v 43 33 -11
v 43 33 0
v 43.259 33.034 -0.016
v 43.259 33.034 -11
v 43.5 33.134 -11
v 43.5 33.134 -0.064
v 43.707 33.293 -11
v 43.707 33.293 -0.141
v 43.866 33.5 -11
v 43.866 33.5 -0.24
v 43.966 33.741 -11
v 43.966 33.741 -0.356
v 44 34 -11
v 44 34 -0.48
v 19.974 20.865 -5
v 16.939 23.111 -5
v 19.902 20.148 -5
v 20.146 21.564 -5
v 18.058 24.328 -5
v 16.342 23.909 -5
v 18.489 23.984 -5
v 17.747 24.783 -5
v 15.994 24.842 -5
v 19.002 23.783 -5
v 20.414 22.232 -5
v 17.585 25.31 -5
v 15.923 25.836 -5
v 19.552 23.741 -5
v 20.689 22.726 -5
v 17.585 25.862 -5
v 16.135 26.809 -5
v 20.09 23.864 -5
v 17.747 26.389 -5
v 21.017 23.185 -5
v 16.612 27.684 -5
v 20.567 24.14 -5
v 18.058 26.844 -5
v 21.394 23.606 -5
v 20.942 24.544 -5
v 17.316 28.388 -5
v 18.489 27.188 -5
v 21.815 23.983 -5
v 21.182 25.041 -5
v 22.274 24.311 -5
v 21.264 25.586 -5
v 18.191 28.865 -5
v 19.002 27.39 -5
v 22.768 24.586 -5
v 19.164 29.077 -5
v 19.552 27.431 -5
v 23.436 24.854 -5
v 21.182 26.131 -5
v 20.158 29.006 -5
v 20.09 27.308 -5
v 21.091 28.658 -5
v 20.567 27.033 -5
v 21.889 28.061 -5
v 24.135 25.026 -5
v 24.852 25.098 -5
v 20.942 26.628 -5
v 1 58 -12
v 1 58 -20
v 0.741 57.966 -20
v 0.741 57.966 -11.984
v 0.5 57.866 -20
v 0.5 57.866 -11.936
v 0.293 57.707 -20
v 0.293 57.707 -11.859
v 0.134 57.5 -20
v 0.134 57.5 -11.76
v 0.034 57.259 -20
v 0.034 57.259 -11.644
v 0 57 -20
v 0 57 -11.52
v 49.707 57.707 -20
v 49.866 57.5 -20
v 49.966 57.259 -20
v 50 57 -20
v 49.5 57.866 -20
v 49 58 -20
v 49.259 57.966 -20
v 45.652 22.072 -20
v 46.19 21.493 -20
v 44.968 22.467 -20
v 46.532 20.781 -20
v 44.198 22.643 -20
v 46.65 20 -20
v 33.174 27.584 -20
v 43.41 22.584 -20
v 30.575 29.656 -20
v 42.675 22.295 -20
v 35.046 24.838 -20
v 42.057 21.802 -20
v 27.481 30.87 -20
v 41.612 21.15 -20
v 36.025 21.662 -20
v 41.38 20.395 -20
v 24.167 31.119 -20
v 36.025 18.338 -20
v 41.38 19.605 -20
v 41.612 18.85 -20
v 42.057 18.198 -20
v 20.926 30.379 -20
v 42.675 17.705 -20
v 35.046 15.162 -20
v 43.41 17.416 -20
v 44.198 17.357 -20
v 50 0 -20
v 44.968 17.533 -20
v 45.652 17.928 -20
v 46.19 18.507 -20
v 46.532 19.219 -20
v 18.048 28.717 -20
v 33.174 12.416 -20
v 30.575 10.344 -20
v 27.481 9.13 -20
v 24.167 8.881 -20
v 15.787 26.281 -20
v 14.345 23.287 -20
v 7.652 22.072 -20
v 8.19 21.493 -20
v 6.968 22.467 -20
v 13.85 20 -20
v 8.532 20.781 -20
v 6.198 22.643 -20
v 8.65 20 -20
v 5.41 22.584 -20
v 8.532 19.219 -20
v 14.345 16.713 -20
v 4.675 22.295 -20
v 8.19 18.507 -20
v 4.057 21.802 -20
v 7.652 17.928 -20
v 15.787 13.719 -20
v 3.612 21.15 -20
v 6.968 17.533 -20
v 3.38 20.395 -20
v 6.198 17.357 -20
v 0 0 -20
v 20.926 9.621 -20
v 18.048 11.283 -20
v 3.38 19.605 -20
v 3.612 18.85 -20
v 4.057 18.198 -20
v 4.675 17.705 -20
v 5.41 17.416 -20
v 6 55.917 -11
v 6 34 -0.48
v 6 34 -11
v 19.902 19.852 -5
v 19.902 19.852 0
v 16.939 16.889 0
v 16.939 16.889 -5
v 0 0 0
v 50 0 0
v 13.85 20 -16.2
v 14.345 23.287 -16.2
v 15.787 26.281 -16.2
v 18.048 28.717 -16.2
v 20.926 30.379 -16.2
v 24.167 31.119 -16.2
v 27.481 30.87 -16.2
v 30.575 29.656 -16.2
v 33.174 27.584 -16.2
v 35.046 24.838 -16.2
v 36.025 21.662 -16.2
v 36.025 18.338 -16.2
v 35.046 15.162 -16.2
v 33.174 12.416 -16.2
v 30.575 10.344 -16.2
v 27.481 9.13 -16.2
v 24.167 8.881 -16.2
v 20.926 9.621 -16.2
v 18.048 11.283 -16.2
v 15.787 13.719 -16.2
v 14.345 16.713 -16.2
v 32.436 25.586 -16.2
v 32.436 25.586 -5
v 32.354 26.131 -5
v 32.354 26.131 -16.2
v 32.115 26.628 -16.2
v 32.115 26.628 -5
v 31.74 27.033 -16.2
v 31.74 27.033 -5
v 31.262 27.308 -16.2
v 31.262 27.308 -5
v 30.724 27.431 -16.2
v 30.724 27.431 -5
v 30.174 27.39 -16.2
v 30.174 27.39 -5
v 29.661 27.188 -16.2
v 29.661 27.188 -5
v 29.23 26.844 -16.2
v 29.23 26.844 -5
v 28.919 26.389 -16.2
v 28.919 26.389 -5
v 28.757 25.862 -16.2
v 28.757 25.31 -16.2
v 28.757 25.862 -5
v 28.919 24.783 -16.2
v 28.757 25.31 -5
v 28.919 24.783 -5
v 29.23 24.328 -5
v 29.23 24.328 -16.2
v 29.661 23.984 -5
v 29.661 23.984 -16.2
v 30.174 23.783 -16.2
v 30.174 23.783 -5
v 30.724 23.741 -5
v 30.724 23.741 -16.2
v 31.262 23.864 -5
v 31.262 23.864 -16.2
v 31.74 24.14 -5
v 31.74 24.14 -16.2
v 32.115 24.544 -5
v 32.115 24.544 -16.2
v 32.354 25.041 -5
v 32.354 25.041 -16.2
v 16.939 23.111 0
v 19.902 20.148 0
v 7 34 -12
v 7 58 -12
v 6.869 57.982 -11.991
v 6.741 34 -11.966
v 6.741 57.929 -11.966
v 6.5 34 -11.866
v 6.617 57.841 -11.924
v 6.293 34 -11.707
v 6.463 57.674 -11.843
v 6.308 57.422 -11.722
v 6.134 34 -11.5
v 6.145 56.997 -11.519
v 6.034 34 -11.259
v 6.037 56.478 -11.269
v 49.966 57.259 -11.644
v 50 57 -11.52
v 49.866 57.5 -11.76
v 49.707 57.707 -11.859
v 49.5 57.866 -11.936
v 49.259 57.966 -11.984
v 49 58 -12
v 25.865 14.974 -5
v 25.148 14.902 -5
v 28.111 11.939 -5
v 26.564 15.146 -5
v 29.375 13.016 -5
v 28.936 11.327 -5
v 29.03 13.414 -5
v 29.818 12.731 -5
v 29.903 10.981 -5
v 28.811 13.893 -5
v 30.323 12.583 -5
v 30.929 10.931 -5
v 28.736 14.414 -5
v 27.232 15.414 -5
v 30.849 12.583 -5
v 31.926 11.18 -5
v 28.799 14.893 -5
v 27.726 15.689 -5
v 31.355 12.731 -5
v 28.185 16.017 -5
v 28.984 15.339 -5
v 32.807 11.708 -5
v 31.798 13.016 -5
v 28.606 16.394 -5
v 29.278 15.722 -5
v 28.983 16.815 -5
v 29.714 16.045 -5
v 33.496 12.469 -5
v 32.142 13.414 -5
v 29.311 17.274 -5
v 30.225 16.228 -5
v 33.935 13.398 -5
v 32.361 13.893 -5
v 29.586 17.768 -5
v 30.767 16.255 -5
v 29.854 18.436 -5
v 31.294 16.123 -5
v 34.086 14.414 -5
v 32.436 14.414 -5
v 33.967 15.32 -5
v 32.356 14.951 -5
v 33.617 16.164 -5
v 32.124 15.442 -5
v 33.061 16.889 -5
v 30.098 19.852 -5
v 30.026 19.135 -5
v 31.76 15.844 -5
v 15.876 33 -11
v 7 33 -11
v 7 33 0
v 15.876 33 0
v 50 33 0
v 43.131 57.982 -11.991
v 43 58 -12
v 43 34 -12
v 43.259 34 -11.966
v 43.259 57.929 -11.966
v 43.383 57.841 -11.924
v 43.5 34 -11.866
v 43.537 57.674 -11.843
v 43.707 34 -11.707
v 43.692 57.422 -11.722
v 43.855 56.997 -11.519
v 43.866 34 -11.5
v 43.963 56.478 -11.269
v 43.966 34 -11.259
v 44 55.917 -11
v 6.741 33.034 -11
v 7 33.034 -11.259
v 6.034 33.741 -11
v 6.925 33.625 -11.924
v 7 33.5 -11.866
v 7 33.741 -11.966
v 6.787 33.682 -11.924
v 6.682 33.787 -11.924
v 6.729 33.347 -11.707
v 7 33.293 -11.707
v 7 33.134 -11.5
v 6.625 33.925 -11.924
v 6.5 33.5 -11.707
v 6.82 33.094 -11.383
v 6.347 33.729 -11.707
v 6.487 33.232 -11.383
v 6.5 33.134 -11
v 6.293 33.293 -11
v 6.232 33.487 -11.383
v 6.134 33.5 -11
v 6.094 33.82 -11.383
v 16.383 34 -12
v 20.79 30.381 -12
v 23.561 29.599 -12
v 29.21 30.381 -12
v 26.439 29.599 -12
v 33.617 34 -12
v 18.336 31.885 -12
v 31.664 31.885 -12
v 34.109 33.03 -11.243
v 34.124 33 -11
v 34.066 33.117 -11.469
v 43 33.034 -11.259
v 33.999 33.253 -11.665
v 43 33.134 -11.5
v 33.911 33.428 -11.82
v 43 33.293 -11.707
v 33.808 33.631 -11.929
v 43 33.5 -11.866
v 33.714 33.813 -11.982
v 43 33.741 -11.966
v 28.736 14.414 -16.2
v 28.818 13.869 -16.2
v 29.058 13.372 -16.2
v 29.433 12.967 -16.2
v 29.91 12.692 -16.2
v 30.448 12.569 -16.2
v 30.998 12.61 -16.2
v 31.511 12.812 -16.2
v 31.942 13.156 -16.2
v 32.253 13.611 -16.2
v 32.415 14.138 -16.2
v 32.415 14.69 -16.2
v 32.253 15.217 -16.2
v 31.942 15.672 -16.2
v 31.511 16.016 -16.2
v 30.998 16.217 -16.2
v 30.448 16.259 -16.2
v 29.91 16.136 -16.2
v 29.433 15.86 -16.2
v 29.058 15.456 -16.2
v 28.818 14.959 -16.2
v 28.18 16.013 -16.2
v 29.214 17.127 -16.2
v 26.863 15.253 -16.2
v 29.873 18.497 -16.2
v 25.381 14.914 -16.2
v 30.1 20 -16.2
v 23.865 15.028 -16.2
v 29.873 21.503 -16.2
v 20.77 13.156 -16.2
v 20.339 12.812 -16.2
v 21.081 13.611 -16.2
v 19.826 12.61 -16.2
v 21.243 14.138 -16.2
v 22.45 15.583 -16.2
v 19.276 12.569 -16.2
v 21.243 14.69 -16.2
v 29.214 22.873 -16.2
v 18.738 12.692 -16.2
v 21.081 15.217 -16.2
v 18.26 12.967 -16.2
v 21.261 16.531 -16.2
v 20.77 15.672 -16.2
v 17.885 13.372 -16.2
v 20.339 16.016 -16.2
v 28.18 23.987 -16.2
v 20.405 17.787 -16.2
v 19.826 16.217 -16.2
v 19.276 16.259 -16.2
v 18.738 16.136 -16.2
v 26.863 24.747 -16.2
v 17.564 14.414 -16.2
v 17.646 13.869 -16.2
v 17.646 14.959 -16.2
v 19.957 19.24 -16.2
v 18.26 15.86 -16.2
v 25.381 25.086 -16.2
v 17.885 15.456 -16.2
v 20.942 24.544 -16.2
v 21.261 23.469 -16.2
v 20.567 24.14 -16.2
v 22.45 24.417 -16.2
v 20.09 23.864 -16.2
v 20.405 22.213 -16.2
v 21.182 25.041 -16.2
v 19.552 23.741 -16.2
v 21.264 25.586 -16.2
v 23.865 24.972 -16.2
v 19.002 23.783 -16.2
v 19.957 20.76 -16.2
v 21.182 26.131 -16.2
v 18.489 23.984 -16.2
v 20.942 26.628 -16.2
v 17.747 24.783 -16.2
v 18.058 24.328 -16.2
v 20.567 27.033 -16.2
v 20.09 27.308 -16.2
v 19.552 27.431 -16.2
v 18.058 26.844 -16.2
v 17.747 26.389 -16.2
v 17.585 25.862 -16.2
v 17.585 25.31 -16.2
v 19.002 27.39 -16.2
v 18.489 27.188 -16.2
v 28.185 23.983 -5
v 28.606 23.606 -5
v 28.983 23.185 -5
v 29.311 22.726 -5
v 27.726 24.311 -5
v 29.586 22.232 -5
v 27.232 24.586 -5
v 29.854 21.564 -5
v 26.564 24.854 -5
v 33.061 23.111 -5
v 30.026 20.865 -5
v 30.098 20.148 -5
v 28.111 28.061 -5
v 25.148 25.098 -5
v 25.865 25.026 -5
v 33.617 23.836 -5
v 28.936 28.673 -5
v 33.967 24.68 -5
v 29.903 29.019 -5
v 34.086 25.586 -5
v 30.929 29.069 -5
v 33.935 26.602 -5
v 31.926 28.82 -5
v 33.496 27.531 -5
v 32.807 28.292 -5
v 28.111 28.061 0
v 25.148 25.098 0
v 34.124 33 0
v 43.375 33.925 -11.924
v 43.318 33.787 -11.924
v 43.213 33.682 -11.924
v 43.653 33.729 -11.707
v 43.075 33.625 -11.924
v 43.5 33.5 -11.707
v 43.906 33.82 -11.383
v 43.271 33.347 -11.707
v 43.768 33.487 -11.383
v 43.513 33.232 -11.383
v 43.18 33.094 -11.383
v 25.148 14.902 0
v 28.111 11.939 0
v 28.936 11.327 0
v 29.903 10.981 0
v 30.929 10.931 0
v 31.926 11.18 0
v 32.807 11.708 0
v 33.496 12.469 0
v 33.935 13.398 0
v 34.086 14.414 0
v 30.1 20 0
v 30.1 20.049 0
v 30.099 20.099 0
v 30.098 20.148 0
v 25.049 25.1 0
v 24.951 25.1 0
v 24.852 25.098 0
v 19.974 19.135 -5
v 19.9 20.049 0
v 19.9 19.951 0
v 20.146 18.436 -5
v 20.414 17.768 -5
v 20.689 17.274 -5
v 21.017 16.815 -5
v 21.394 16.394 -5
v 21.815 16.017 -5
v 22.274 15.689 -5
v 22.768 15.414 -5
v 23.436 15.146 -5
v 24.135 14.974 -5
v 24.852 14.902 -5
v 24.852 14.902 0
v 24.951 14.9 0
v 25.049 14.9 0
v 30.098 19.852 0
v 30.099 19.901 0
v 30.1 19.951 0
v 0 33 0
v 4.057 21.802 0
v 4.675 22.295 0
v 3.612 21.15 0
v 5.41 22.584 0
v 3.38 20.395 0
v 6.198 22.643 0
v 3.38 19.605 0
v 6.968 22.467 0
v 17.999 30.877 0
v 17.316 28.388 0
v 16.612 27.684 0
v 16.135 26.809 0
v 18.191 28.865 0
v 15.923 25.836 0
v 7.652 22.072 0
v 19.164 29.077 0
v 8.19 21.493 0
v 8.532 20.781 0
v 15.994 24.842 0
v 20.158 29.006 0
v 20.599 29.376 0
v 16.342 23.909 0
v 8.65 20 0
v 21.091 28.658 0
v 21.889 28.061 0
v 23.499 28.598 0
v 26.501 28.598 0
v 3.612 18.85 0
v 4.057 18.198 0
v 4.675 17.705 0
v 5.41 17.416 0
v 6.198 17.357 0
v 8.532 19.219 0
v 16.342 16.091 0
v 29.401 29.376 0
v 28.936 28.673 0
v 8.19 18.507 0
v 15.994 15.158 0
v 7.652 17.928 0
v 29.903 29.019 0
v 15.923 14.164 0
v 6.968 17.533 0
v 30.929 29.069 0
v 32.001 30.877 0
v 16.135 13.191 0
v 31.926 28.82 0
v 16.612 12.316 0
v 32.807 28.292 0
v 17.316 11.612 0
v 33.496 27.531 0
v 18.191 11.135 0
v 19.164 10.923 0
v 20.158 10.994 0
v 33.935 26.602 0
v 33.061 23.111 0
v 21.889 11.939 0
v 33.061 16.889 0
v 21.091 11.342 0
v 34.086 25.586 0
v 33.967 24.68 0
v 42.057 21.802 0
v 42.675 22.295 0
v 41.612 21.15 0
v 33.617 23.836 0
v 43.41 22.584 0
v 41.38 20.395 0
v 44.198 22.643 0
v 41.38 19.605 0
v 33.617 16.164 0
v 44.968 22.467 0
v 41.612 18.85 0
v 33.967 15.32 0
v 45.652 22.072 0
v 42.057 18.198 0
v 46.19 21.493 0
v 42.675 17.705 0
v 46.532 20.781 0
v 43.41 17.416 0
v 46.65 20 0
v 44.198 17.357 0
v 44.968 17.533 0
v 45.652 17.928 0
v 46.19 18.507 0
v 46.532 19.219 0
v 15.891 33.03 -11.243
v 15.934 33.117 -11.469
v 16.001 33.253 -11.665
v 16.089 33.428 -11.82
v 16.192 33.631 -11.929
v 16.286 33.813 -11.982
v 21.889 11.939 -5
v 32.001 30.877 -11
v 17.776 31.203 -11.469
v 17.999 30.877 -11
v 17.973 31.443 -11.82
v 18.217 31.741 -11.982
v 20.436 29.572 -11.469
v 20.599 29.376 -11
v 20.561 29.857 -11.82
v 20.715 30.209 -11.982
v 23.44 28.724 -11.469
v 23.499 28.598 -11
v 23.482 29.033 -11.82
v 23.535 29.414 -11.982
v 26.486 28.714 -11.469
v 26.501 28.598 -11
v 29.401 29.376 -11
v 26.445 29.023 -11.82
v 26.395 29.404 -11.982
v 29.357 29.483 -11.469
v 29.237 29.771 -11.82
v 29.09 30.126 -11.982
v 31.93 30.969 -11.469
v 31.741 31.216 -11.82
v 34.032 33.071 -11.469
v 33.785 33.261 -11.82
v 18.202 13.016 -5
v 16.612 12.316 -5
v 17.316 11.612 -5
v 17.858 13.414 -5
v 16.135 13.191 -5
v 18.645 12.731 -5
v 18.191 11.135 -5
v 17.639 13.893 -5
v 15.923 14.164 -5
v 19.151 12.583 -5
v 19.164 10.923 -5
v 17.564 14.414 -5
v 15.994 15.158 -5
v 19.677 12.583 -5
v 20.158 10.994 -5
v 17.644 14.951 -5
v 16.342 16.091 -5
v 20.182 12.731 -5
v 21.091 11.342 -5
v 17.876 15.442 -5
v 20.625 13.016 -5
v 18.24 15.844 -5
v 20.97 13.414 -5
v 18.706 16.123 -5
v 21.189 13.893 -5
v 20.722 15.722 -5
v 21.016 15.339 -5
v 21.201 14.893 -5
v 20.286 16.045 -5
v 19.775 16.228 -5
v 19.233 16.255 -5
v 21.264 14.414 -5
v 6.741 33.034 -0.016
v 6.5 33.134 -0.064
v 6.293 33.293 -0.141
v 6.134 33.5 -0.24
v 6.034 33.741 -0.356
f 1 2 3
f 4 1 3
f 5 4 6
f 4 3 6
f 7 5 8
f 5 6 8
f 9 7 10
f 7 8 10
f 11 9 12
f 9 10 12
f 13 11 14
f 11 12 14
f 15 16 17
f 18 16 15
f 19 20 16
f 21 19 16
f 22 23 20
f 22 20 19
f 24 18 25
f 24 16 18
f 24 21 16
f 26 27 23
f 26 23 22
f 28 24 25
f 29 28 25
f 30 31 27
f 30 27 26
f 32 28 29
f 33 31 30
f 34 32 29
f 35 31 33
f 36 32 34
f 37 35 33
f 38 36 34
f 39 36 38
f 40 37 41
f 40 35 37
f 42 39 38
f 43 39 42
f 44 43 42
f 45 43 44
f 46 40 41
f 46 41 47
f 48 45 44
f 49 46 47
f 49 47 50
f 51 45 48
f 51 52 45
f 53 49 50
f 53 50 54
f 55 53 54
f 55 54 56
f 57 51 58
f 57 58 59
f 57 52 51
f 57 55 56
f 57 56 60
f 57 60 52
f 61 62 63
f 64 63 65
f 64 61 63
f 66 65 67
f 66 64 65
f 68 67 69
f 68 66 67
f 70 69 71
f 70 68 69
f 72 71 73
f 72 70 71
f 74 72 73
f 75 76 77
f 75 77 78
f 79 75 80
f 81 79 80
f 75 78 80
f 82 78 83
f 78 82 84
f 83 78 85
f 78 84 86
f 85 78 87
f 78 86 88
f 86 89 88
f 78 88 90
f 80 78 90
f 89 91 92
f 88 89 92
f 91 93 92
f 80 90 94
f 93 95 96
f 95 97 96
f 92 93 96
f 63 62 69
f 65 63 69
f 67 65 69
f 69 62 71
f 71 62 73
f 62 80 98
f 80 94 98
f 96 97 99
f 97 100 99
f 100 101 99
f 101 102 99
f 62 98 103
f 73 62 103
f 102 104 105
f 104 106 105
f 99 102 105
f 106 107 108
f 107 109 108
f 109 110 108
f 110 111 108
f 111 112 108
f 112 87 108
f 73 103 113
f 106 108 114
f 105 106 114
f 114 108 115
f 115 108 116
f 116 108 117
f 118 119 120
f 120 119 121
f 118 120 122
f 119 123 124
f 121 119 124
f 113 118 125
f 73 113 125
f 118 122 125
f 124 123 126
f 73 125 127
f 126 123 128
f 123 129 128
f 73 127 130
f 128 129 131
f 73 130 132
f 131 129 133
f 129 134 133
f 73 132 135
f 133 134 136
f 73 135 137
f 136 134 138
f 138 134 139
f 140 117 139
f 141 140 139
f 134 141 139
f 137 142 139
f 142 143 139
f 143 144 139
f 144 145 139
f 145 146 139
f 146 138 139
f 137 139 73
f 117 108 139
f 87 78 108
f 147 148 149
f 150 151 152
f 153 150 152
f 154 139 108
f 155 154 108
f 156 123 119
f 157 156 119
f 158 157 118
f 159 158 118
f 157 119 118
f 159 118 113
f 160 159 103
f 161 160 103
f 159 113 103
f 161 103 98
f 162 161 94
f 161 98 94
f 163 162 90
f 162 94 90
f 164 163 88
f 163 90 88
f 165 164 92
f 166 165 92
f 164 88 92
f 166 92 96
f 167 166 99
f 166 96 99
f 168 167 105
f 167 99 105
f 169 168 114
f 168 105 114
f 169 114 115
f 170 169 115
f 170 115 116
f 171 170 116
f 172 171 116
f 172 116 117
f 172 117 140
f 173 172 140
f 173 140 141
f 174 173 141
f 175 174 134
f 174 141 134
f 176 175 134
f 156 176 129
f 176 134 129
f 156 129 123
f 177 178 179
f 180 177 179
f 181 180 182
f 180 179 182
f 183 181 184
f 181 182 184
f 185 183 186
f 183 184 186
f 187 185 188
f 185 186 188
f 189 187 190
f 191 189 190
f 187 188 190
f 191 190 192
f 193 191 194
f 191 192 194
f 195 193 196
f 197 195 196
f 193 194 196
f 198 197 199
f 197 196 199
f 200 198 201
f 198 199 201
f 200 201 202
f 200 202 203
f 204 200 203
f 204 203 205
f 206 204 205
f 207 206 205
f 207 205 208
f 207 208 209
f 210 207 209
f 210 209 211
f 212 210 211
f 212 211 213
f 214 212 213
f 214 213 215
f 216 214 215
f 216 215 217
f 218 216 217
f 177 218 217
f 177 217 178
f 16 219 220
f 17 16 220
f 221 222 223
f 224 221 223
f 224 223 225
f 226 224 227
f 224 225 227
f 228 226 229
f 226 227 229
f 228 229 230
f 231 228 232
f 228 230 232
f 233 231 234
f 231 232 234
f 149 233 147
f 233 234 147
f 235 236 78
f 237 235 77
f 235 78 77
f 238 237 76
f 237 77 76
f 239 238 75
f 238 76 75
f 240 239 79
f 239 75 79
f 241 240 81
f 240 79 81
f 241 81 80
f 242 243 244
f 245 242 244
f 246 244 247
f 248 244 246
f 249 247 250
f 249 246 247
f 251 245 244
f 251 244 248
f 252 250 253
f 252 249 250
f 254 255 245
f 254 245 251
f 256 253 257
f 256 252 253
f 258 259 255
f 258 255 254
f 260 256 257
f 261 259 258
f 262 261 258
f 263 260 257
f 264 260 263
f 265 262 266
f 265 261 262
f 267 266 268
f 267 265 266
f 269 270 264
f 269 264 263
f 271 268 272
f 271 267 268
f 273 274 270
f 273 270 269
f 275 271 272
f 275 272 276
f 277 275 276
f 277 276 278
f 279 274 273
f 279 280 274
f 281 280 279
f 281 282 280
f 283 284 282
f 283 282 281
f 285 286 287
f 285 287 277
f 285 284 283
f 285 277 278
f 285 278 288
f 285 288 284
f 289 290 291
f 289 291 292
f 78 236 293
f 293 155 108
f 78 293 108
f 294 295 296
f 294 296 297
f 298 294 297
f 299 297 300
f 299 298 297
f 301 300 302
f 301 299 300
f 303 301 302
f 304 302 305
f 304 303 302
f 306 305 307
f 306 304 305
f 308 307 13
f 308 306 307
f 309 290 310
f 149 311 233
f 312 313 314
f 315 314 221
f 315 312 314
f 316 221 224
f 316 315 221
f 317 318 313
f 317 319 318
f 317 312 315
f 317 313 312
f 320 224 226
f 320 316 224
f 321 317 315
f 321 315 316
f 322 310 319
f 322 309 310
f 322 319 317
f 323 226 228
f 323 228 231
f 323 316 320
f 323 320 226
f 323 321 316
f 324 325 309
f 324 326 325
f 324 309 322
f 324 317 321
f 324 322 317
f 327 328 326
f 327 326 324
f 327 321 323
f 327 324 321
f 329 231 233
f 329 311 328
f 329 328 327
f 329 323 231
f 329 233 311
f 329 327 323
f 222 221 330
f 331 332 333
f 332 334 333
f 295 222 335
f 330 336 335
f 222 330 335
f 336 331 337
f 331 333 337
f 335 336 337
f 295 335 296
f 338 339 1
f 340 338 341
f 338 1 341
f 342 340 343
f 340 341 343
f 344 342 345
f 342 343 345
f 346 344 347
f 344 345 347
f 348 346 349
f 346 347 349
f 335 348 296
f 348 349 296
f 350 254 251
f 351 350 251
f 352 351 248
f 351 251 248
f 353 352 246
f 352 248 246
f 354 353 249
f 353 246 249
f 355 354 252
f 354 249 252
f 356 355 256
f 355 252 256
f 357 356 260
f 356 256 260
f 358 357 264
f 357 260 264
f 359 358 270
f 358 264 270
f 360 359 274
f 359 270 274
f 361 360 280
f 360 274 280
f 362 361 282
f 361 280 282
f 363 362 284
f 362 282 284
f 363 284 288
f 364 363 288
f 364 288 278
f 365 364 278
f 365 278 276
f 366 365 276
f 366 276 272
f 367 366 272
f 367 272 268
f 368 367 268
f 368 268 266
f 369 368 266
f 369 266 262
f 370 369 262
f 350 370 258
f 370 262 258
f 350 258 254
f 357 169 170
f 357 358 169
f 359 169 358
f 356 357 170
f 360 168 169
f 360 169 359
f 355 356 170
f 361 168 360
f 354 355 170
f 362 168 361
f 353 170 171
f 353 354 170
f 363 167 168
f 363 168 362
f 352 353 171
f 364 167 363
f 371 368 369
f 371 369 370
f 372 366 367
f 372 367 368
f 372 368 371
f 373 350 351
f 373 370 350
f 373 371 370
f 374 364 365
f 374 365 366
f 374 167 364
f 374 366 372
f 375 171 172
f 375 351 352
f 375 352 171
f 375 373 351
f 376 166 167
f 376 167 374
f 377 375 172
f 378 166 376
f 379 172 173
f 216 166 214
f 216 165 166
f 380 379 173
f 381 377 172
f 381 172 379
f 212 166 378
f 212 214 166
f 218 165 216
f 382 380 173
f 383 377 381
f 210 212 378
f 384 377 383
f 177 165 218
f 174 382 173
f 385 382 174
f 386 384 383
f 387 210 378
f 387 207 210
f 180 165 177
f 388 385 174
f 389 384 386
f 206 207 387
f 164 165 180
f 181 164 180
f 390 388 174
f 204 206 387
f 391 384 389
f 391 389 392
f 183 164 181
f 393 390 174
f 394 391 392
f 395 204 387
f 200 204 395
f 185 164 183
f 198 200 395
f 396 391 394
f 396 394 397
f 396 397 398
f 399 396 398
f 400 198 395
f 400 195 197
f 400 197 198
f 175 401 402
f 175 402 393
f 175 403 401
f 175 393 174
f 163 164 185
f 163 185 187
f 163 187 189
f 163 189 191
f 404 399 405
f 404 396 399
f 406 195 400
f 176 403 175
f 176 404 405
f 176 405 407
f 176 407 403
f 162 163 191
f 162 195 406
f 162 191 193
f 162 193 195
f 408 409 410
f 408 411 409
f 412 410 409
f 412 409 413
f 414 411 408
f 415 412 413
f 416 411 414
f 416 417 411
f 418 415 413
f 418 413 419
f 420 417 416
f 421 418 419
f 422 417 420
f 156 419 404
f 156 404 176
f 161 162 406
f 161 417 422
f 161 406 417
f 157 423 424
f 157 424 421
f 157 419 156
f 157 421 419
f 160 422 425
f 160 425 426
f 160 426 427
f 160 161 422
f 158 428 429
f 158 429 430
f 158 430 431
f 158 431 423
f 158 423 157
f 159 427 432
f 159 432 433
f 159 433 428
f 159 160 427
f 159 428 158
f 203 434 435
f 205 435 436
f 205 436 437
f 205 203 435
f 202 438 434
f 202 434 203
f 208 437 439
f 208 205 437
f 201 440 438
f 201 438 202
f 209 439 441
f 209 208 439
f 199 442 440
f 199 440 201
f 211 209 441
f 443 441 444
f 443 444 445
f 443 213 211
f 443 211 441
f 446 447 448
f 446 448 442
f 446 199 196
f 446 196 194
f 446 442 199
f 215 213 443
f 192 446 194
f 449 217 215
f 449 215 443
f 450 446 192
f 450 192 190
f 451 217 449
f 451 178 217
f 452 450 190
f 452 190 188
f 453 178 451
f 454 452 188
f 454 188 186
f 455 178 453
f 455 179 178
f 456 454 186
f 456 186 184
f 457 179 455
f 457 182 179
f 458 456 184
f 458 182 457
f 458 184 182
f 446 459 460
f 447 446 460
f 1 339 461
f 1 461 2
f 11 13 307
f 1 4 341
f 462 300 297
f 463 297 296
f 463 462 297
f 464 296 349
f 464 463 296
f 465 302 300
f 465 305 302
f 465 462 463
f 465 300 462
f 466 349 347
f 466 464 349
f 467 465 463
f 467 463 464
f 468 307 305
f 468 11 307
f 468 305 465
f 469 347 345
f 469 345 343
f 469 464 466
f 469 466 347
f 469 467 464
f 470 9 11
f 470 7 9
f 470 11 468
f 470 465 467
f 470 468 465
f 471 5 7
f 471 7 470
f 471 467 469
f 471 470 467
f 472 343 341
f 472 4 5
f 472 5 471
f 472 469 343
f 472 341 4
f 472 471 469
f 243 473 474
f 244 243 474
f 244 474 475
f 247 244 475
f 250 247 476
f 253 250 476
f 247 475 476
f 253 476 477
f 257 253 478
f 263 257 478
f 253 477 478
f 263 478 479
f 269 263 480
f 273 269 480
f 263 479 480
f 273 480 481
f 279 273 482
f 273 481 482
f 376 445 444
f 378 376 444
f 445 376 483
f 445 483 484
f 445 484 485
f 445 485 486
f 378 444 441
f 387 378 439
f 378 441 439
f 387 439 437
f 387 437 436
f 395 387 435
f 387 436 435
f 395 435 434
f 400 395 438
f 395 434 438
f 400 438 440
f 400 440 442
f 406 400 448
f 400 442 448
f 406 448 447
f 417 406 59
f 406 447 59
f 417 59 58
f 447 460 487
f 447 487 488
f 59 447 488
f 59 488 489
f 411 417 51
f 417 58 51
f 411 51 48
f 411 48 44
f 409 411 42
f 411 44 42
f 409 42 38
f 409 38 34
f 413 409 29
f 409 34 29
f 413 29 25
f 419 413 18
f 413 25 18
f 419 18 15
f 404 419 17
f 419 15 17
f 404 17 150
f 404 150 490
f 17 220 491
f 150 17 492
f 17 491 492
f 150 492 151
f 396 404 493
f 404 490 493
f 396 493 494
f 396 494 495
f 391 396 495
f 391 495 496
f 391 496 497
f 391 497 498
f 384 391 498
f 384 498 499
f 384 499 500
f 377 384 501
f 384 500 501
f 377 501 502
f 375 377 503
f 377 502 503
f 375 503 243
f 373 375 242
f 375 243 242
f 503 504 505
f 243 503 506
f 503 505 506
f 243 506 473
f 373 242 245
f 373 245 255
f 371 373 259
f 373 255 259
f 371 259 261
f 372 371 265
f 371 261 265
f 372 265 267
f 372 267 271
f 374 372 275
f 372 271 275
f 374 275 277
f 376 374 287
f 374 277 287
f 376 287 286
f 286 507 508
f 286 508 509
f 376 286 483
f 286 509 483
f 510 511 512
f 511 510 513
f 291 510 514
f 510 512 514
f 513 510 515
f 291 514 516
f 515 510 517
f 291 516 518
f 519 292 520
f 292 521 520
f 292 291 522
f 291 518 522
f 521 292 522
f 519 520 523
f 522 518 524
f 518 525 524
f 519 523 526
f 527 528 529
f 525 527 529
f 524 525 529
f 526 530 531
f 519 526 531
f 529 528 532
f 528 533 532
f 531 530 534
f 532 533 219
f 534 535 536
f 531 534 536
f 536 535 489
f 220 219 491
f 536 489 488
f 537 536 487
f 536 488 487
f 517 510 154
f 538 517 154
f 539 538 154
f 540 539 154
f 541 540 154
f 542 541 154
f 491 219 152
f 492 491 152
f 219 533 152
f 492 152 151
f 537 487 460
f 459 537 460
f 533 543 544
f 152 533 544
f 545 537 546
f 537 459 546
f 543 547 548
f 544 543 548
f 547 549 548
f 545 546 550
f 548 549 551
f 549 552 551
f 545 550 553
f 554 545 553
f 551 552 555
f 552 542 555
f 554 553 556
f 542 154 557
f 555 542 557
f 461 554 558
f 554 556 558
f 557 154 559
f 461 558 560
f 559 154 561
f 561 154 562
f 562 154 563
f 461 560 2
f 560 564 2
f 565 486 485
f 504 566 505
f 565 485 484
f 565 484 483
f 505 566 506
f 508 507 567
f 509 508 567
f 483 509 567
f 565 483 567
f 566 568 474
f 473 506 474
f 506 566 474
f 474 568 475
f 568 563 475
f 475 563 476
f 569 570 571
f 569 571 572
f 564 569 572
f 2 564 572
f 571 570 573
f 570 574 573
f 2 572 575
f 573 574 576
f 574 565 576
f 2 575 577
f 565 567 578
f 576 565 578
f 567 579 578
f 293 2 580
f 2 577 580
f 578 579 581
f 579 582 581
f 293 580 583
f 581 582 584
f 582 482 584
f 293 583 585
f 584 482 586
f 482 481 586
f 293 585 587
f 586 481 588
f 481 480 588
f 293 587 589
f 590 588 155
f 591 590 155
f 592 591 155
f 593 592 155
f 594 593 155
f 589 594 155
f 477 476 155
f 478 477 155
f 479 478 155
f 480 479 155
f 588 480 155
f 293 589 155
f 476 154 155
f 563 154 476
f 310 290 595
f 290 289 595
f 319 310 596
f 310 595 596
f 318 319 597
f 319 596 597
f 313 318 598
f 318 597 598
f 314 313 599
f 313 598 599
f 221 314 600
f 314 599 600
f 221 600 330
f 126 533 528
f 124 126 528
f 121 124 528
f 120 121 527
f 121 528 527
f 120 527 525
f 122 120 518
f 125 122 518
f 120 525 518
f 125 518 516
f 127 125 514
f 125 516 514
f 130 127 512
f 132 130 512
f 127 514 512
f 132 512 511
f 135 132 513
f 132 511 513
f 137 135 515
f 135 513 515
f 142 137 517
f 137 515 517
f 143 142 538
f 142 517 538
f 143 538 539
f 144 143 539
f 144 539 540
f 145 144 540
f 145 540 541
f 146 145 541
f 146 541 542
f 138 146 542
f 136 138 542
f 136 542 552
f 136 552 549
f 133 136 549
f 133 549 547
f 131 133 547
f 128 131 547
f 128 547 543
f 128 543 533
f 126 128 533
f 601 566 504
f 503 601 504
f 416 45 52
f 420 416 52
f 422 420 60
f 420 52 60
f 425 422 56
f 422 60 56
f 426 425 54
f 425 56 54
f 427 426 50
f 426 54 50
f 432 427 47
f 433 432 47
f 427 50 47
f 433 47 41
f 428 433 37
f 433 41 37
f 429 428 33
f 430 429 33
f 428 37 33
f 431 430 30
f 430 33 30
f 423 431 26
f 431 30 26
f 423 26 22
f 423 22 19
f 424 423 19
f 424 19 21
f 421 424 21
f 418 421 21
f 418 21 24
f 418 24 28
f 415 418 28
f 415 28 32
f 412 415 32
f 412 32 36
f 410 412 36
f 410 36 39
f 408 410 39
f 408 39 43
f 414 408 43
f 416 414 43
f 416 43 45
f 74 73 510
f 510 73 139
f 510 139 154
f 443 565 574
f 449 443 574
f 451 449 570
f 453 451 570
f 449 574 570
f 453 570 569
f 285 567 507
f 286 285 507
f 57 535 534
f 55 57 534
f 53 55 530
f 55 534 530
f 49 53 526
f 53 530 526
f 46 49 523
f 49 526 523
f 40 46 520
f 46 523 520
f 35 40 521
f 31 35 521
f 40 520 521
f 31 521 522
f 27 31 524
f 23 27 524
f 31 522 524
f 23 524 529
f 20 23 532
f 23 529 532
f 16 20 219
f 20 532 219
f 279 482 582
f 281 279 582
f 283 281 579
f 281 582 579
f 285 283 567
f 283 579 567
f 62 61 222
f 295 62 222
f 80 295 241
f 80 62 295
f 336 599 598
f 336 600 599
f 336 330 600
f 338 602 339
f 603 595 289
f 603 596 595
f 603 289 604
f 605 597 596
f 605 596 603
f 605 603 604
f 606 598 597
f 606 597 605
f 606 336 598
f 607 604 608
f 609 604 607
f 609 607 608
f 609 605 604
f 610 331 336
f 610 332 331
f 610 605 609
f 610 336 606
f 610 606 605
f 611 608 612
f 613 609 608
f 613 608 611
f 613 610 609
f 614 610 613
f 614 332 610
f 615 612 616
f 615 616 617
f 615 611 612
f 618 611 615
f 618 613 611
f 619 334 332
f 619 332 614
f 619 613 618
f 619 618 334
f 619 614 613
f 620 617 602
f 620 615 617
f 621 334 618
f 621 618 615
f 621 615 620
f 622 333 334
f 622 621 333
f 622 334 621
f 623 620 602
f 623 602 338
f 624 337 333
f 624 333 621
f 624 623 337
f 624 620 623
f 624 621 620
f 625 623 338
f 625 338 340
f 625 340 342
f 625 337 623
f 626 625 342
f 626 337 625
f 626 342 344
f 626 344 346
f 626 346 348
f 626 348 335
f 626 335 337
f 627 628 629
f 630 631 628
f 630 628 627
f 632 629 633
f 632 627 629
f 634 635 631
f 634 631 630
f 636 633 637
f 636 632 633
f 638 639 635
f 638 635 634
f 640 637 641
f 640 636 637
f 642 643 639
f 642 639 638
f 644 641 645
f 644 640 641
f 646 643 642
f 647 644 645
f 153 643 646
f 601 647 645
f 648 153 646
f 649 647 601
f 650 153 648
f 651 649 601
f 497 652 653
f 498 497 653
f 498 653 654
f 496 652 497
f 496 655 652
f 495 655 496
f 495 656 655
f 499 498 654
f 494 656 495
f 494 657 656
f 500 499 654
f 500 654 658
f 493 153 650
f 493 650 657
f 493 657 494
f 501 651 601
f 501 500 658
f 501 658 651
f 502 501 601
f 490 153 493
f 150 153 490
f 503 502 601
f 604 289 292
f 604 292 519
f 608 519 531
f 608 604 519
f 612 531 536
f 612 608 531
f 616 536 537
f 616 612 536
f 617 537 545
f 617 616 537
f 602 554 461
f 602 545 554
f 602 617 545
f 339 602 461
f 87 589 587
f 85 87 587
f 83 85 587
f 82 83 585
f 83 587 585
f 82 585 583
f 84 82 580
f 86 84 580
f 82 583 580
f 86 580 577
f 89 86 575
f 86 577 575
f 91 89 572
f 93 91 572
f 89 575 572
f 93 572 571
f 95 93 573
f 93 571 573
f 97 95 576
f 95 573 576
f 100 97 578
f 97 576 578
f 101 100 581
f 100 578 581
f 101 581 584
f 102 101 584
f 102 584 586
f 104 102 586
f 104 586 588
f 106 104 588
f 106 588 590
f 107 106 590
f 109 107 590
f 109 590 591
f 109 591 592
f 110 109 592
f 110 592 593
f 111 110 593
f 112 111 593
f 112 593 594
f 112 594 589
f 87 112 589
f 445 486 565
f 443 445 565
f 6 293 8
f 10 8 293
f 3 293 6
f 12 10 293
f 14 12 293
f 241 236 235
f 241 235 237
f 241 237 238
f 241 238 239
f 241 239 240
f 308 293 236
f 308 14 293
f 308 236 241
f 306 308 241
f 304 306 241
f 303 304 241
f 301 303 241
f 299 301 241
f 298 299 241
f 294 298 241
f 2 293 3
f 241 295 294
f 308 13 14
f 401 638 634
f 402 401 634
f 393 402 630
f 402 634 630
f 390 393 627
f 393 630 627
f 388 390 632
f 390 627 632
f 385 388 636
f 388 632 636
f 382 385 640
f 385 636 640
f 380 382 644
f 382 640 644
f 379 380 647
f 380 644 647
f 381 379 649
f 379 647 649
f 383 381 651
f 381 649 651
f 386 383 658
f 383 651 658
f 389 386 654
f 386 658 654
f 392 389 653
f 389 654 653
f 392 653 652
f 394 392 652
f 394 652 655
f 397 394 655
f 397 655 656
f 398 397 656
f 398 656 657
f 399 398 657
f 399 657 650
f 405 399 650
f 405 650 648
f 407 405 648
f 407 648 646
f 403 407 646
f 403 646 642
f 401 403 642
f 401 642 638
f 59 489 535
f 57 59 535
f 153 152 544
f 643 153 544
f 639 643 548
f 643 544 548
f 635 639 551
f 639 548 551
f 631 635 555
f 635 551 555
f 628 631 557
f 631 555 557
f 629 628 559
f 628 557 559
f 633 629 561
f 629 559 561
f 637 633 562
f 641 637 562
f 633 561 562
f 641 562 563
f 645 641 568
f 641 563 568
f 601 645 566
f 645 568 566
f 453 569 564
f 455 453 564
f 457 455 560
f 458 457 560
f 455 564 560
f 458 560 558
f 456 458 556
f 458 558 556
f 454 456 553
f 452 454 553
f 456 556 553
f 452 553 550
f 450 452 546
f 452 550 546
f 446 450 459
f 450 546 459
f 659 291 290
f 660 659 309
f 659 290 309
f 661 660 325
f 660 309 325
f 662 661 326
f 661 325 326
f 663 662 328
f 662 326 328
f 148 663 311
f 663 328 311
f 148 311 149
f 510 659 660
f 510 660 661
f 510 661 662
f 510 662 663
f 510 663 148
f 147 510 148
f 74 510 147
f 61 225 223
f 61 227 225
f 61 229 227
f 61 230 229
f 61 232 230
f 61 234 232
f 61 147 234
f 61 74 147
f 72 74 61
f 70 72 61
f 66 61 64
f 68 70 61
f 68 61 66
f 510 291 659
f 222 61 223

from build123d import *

# Parameters (mm, degrees)
SKETCH1_W           = 50
SKETCH1_H           = 20
BOSS_EXTRUDE1_DEPTH = 33
SKETCH2_R           = 2.65
CUT_EXTRUDE1_DEPTH  = 64.158530699
BOSS_EXTRUDE2_DEPTH = 25
CUT_EXTRUDE8_DEPTH  = 80.14543575
SKETCH10_R          = 11.5
CUT_EXTRUDE10_DEPTH = 78.5112895
FILLET1_R           = 1
SKETCH3_R           = 5.1
SKETCH3_R_2         = 1.85
CUT_EXTRUDE11_DEPTH = 80.14543575
SKETCH11_R          = 11.15
CUT_EXTRUDE12_DEPTH = 3.8
CUT_EXTRUDE14_DEPTH = 5


with BuildPart() as part:
    # Sketch1 → Boss-Extrude1 (new body)
    with BuildSketch(Plane(origin=(0, 0, 0), x_dir=(1, 0, 0), z_dir=(0, 1, 0))):
        with Locations((25, 10)):
            Rectangle(SKETCH1_W, SKETCH1_H)
    extrude(amount=BOSS_EXTRUDE1_DEPTH)

    # Sketch2 → Cut-Extrude1 (cut, through all)
    with BuildSketch(Plane.XY):
        with Locations((6, 20)):
            Circle(SKETCH2_R)
        with Locations((44, 20)):
            Circle(SKETCH2_R)
    extrude(amount=-CUT_EXTRUDE1_DEPTH, mode=Mode.SUBTRACT)

    # Sketch7 → Boss-Extrude2 (add)
    with BuildSketch(Plane(origin=(0, 33, 0), x_dir=(1, 0, 0), z_dir=(0, 1, 0))):
        Polygon((50, 0), (50, 20), (0, 20), (0, 0), (6, 0), (6, 12), (44, 12), (44, 0), align=None)
    extrude(amount=BOSS_EXTRUDE2_DEPTH)

    # Sketch8 → Cut-Extrude8 (cut, through all)
    with BuildSketch(Plane.ZY):
        Polygon((0, 58), (0, 33), (-12, 58), align=None)
    extrude(amount=-CUT_EXTRUDE8_DEPTH, mode=Mode.SUBTRACT)

    # Sketch10 → Cut-Extrude10 (cut, through all)
    with BuildSketch(Plane.XY.offset(-12)):
        with Locations((25, 40)):
            Circle(SKETCH10_R)
    extrude(amount=CUT_EXTRUDE10_DEPTH, mode=Mode.SUBTRACT)

    # Fillet1
    fillet1_edges = [part.edges().sort_by_distance(p)[0] for p in [
        (6, 33, -6),
        (10.937928102, 33, -12),
        (6, 45.5, -12),
        (44, 33, -6),
        (44, 45.5, -12),
        (0, 58, -16),
        (50, 58, -16),
        (39.062071898, 33, -12),
        (25, 28.5, -12),
    ]]
    fillet(fillet1_edges, radius=FILLET1_R)

    # Sketch3 → Cut-Extrude11 (cut, through all)
    with BuildSketch(Plane.XY):
        with Locations((25, 20)):
            Circle(SKETCH3_R)
        with Locations((19.413856429, 25.586143571)):
            Circle(SKETCH3_R_2)
        with Locations((30.586143571, 25.586143571)):
            Circle(SKETCH3_R_2)
        with Locations(Location((30.586143571, 14.413856429, 0), (0, 0, 180))):
            Circle(SKETCH3_R_2)
        with Locations(Location((19.413856429, 14.413856429, 0), (0, 0, 180))):
            Circle(SKETCH3_R_2)
    extrude(amount=-CUT_EXTRUDE11_DEPTH, mode=Mode.SUBTRACT)

    # Sketch11 → Cut-Extrude12 (cut)
    with BuildSketch(Plane(origin=(0, 0, -20), x_dir=(-1, 0, 0), z_dir=(0, 0, -1))):
        with Locations((-25, 20)):
            Circle(SKETCH11_R)
    extrude(amount=-CUT_EXTRUDE12_DEPTH, mode=Mode.SUBTRACT)

    # Sketch12 → Cut-Extrude14 (cut)
    # profile 1 of 16: a face of its own
    with BuildSketch(Plane.XY):
        with BuildLine():
            ThreePointArc((21.888730163, 28.061017306), (16.938982694, 28.061017306), (16.938982694, 23.111269837))
            Line((16.938982694, 23.111269837), (19.413856429, 25.586143571))
            Line((19.413856429, 25.586143571), (21.888730163, 28.061017306))
        make_face()
    # profile 2 of 16: a face of its own
    with BuildSketch(Plane.XY):
        with BuildLine():
            Line((21.888730163, 28.061017306), (19.413856429, 25.586143571))
            Line((19.413856429, 25.586143571), (21.393755416, 23.606244584))
            ThreePointArc((21.393755416, 23.606244584), (22.039987111, 24.153110124), (22.76777875, 24.585541221))
            ThreePointArc((22.76777875, 24.585541221), (22.877144471, 25.080539044), (22.913856429, 25.586143571))
            ThreePointArc((22.913856429, 25.586143571), (22.647434792, 26.925535585), (21.888730163, 28.061017306))
        make_face()
    # profile 3 of 16: a face of its own
    with BuildSketch(Plane.XY):
        with BuildLine():
            Line((24.851898324, 25.097849144), (21.888730163, 28.061017306))
            ThreePointArc((21.888730163, 28.061017306), (22.647434792, 26.925535585), (22.913856429, 25.586143571))
            ThreePointArc((22.913856429, 25.586143571), (22.877144471, 25.080539044), (22.76777875, 24.585541221))
            ThreePointArc((22.76777875, 24.585541221), (23.78258505, 24.952565077), (24.851898324, 25.097849144))
        make_face()
    # profile 4 of 16: a face of its own
    with BuildSketch(Plane.XY):
        with BuildLine():
            Line((19.413856429, 25.586143571), (16.938982694, 23.111269837))
            ThreePointArc((16.938982694, 23.111269837), (18.555631148, 22.192996158), (20.414458779, 22.23222125))
            ThreePointArc((20.414458779, 22.23222125), (20.846889876, 22.960012889), (21.393755416, 23.606244584))
            Line((21.393755416, 23.606244584), (19.413856429, 25.586143571))
        make_face()
    # profile 5 of 16: a face of its own
    with BuildSketch(Plane.XY):
        with BuildLine():
            Line((16.938982694, 23.111269837), (19.902150856, 20.148101676))
            ThreePointArc((19.902150856, 20.148101676), (20.047434923, 21.21741495), (20.414458779, 22.23222125))
            ThreePointArc((20.414458779, 22.23222125), (18.555631148, 22.192996158), (16.938982694, 23.111269837))
        make_face()
    # profile 6 of 16: a face of its own
    with BuildSketch(Plane.XY):
        with BuildLine():
            ThreePointArc((25.148101676, 25.097849144), (26.21741495, 24.952565077), (27.23222125, 24.585541221))
            ThreePointArc((27.23222125, 24.585541221), (27.192996158, 26.444368852), (28.111269837, 28.061017306))
            Line((28.111269837, 28.061017306), (25.148101676, 25.097849144))
        make_face()
    # profile 7 of 16: a face of its own
    with BuildSketch(Plane.XY):
        with BuildLine():
            ThreePointArc((27.23222125, 24.585541221), (27.960012889, 24.153110124), (28.606244584, 23.606244584))
            Line((28.606244584, 23.606244584), (30.586143571, 25.586143571))
            Line((30.586143571, 25.586143571), (28.111269837, 28.061017306))
            ThreePointArc((28.111269837, 28.061017306), (27.192996158, 26.444368852), (27.23222125, 24.585541221))
        make_face()
    # profile 8 of 16: a face of its own
    with BuildSketch(Plane.XY):
        with BuildLine():
            Line((28.111269837, 28.061017306), (30.586143571, 25.586143571))
            Line((30.586143571, 25.586143571), (33.061017306, 23.111269837))
            ThreePointArc((33.061017306, 23.111269837), (33.819721935, 24.246751558), (34.086143571, 25.586143571))
            ThreePointArc((34.086143571, 25.586143571), (31.925535585, 28.819721935), (28.111269837, 28.061017306))
        make_face()
    # profile 9 of 16: a face of its own
    with BuildSketch(Plane.XY):
        with BuildLine():
            Line((30.586143571, 25.586143571), (28.606244584, 23.606244584))
            ThreePointArc((28.606244584, 23.606244584), (29.153110124, 22.960012889), (29.585541221, 22.23222125))
            ThreePointArc((29.585541221, 22.23222125), (31.444368852, 22.192996158), (33.061017306, 23.111269837))
            Line((33.061017306, 23.111269837), (30.586143571, 25.586143571))
        make_face()
    # profile 10 of 16: a face of its own
    with BuildSketch(Plane.XY):
        with BuildLine():
            ThreePointArc((33.061017306, 23.111269837), (31.444368852, 22.192996158), (29.585541221, 22.23222125))
            ThreePointArc((29.585541221, 22.23222125), (29.952565077, 21.21741495), (30.097849144, 20.148101676))
            Line((30.097849144, 20.148101676), (33.061017306, 23.111269837))
        make_face()
    # profile 11 of 16: a face of its own
    with BuildSketch(Plane.XY):
        with BuildLine():
            ThreePointArc((27.23222125, 15.414458779), (27.192996158, 13.555631148), (28.111269837, 11.938982694))
            ThreePointArc((28.111269837, 11.938982694), (31.925535585, 11.180278065), (34.086143571, 14.413856429))
            ThreePointArc((34.086143571, 14.413856429), (33.819721928, 15.753248458), (33.061017281, 16.888730188))
            ThreePointArc((33.061017281, 16.888730188), (31.444368835, 17.807003846), (29.585541221, 17.76777875))
            ThreePointArc((29.585541221, 17.76777875), (29.153110124, 17.039987111), (28.606244584, 16.393755416))
            ThreePointArc((28.606244584, 16.393755416), (27.960012889, 15.846889876), (27.23222125, 15.414458779))
        make_face()
        with BuildLine():
            ThreePointArc((32.436143571, 14.413856429), (29.878179221, 12.704679293), (29.277996026, 15.722003974))
            ThreePointArc((29.277996026, 15.722003974), (31.294107921, 16.123033564), (32.436143571, 14.413856429))
        make_face(mode=Mode.SUBTRACT)
    # profile 12 of 16: a face of its own
    with BuildSketch(Plane.XY):
        with BuildLine():
            ThreePointArc((27.23222125, 15.414458779), (26.21741495, 15.047434923), (25.148101676, 14.902150856))
            Line((25.148101676, 14.902150856), (28.111269837, 11.938982694))
            ThreePointArc((28.111269837, 11.938982694), (27.192996158, 13.555631148), (27.23222125, 15.414458779))
        make_face()
    # profile 13 of 16: a face of its own
    with BuildSketch(Plane.XY):
        with BuildLine():
            ThreePointArc((22.76777875, 15.414458779), (22.039987111, 15.846889876), (21.393755416, 16.393755416))
            ThreePointArc((21.393755416, 16.393755416), (20.846889876, 17.039987111), (20.414458779, 17.76777875))
            ThreePointArc((20.414458779, 17.76777875), (18.555631148, 17.807003842), (16.938982694, 16.888730163))
            ThreePointArc((16.938982694, 16.888730163), (16.9389827, 11.938982689), (21.888730174, 11.938982705))
            ThreePointArc((21.888730174, 11.938982705), (22.647434795, 13.074464422), (22.913856429, 14.413856429))
            ThreePointArc((22.913856429, 14.413856429), (22.877144471, 14.919460956), (22.76777875, 15.414458779))
        make_face()
        with BuildLine():
            ThreePointArc((21.263856429, 14.413856429), (17.704679293, 13.705892079), (20.722003974, 15.722003974))
            ThreePointArc((20.722003974, 15.722003974), (21.123033564, 15.121820779), (21.263856429, 14.413856429))
        make_face(mode=Mode.SUBTRACT)
    # profile 14 of 16: a face of its own
    with BuildSketch(Plane.XY):
        with BuildLine():
            ThreePointArc((24.851898324, 14.902150856), (23.78258505, 15.047434923), (22.76777875, 15.414458779))
            ThreePointArc((22.76777875, 15.414458779), (22.877144471, 14.919460956), (22.913856429, 14.413856429))
            ThreePointArc((22.913856429, 14.413856429), (22.647434795, 13.074464422), (21.888730174, 11.938982705))
            Line((21.888730174, 11.938982705), (24.851898324, 14.902150856))
        make_face()
    # profile 15 of 16: a face of its own
    with BuildSketch(Plane.XY):
        with BuildLine():
            ThreePointArc((16.938982694, 16.888730163), (18.555631148, 17.807003842), (20.414458779, 17.76777875))
            ThreePointArc((20.414458779, 17.76777875), (20.047434923, 18.78258505), (19.902150856, 19.851898324))
            Line((19.902150856, 19.851898324), (16.938982694, 16.888730163))
        make_face()
    # profile 16 of 16: a face of its own
    with BuildSketch(Plane.XY):
        with BuildLine():
            Line((33.061017281, 16.888730188), (30.097849144, 19.851898324))
            ThreePointArc((30.097849144, 19.851898324), (29.952565077, 18.78258505), (29.585541221, 17.76777875))
            ThreePointArc((29.585541221, 17.76777875), (31.444368835, 17.807003846), (33.061017281, 16.888730188))
        make_face()
    extrude(amount=-CUT_EXTRUDE14_DEPTH, mode=Mode.SUBTRACT)


solid = part.part
